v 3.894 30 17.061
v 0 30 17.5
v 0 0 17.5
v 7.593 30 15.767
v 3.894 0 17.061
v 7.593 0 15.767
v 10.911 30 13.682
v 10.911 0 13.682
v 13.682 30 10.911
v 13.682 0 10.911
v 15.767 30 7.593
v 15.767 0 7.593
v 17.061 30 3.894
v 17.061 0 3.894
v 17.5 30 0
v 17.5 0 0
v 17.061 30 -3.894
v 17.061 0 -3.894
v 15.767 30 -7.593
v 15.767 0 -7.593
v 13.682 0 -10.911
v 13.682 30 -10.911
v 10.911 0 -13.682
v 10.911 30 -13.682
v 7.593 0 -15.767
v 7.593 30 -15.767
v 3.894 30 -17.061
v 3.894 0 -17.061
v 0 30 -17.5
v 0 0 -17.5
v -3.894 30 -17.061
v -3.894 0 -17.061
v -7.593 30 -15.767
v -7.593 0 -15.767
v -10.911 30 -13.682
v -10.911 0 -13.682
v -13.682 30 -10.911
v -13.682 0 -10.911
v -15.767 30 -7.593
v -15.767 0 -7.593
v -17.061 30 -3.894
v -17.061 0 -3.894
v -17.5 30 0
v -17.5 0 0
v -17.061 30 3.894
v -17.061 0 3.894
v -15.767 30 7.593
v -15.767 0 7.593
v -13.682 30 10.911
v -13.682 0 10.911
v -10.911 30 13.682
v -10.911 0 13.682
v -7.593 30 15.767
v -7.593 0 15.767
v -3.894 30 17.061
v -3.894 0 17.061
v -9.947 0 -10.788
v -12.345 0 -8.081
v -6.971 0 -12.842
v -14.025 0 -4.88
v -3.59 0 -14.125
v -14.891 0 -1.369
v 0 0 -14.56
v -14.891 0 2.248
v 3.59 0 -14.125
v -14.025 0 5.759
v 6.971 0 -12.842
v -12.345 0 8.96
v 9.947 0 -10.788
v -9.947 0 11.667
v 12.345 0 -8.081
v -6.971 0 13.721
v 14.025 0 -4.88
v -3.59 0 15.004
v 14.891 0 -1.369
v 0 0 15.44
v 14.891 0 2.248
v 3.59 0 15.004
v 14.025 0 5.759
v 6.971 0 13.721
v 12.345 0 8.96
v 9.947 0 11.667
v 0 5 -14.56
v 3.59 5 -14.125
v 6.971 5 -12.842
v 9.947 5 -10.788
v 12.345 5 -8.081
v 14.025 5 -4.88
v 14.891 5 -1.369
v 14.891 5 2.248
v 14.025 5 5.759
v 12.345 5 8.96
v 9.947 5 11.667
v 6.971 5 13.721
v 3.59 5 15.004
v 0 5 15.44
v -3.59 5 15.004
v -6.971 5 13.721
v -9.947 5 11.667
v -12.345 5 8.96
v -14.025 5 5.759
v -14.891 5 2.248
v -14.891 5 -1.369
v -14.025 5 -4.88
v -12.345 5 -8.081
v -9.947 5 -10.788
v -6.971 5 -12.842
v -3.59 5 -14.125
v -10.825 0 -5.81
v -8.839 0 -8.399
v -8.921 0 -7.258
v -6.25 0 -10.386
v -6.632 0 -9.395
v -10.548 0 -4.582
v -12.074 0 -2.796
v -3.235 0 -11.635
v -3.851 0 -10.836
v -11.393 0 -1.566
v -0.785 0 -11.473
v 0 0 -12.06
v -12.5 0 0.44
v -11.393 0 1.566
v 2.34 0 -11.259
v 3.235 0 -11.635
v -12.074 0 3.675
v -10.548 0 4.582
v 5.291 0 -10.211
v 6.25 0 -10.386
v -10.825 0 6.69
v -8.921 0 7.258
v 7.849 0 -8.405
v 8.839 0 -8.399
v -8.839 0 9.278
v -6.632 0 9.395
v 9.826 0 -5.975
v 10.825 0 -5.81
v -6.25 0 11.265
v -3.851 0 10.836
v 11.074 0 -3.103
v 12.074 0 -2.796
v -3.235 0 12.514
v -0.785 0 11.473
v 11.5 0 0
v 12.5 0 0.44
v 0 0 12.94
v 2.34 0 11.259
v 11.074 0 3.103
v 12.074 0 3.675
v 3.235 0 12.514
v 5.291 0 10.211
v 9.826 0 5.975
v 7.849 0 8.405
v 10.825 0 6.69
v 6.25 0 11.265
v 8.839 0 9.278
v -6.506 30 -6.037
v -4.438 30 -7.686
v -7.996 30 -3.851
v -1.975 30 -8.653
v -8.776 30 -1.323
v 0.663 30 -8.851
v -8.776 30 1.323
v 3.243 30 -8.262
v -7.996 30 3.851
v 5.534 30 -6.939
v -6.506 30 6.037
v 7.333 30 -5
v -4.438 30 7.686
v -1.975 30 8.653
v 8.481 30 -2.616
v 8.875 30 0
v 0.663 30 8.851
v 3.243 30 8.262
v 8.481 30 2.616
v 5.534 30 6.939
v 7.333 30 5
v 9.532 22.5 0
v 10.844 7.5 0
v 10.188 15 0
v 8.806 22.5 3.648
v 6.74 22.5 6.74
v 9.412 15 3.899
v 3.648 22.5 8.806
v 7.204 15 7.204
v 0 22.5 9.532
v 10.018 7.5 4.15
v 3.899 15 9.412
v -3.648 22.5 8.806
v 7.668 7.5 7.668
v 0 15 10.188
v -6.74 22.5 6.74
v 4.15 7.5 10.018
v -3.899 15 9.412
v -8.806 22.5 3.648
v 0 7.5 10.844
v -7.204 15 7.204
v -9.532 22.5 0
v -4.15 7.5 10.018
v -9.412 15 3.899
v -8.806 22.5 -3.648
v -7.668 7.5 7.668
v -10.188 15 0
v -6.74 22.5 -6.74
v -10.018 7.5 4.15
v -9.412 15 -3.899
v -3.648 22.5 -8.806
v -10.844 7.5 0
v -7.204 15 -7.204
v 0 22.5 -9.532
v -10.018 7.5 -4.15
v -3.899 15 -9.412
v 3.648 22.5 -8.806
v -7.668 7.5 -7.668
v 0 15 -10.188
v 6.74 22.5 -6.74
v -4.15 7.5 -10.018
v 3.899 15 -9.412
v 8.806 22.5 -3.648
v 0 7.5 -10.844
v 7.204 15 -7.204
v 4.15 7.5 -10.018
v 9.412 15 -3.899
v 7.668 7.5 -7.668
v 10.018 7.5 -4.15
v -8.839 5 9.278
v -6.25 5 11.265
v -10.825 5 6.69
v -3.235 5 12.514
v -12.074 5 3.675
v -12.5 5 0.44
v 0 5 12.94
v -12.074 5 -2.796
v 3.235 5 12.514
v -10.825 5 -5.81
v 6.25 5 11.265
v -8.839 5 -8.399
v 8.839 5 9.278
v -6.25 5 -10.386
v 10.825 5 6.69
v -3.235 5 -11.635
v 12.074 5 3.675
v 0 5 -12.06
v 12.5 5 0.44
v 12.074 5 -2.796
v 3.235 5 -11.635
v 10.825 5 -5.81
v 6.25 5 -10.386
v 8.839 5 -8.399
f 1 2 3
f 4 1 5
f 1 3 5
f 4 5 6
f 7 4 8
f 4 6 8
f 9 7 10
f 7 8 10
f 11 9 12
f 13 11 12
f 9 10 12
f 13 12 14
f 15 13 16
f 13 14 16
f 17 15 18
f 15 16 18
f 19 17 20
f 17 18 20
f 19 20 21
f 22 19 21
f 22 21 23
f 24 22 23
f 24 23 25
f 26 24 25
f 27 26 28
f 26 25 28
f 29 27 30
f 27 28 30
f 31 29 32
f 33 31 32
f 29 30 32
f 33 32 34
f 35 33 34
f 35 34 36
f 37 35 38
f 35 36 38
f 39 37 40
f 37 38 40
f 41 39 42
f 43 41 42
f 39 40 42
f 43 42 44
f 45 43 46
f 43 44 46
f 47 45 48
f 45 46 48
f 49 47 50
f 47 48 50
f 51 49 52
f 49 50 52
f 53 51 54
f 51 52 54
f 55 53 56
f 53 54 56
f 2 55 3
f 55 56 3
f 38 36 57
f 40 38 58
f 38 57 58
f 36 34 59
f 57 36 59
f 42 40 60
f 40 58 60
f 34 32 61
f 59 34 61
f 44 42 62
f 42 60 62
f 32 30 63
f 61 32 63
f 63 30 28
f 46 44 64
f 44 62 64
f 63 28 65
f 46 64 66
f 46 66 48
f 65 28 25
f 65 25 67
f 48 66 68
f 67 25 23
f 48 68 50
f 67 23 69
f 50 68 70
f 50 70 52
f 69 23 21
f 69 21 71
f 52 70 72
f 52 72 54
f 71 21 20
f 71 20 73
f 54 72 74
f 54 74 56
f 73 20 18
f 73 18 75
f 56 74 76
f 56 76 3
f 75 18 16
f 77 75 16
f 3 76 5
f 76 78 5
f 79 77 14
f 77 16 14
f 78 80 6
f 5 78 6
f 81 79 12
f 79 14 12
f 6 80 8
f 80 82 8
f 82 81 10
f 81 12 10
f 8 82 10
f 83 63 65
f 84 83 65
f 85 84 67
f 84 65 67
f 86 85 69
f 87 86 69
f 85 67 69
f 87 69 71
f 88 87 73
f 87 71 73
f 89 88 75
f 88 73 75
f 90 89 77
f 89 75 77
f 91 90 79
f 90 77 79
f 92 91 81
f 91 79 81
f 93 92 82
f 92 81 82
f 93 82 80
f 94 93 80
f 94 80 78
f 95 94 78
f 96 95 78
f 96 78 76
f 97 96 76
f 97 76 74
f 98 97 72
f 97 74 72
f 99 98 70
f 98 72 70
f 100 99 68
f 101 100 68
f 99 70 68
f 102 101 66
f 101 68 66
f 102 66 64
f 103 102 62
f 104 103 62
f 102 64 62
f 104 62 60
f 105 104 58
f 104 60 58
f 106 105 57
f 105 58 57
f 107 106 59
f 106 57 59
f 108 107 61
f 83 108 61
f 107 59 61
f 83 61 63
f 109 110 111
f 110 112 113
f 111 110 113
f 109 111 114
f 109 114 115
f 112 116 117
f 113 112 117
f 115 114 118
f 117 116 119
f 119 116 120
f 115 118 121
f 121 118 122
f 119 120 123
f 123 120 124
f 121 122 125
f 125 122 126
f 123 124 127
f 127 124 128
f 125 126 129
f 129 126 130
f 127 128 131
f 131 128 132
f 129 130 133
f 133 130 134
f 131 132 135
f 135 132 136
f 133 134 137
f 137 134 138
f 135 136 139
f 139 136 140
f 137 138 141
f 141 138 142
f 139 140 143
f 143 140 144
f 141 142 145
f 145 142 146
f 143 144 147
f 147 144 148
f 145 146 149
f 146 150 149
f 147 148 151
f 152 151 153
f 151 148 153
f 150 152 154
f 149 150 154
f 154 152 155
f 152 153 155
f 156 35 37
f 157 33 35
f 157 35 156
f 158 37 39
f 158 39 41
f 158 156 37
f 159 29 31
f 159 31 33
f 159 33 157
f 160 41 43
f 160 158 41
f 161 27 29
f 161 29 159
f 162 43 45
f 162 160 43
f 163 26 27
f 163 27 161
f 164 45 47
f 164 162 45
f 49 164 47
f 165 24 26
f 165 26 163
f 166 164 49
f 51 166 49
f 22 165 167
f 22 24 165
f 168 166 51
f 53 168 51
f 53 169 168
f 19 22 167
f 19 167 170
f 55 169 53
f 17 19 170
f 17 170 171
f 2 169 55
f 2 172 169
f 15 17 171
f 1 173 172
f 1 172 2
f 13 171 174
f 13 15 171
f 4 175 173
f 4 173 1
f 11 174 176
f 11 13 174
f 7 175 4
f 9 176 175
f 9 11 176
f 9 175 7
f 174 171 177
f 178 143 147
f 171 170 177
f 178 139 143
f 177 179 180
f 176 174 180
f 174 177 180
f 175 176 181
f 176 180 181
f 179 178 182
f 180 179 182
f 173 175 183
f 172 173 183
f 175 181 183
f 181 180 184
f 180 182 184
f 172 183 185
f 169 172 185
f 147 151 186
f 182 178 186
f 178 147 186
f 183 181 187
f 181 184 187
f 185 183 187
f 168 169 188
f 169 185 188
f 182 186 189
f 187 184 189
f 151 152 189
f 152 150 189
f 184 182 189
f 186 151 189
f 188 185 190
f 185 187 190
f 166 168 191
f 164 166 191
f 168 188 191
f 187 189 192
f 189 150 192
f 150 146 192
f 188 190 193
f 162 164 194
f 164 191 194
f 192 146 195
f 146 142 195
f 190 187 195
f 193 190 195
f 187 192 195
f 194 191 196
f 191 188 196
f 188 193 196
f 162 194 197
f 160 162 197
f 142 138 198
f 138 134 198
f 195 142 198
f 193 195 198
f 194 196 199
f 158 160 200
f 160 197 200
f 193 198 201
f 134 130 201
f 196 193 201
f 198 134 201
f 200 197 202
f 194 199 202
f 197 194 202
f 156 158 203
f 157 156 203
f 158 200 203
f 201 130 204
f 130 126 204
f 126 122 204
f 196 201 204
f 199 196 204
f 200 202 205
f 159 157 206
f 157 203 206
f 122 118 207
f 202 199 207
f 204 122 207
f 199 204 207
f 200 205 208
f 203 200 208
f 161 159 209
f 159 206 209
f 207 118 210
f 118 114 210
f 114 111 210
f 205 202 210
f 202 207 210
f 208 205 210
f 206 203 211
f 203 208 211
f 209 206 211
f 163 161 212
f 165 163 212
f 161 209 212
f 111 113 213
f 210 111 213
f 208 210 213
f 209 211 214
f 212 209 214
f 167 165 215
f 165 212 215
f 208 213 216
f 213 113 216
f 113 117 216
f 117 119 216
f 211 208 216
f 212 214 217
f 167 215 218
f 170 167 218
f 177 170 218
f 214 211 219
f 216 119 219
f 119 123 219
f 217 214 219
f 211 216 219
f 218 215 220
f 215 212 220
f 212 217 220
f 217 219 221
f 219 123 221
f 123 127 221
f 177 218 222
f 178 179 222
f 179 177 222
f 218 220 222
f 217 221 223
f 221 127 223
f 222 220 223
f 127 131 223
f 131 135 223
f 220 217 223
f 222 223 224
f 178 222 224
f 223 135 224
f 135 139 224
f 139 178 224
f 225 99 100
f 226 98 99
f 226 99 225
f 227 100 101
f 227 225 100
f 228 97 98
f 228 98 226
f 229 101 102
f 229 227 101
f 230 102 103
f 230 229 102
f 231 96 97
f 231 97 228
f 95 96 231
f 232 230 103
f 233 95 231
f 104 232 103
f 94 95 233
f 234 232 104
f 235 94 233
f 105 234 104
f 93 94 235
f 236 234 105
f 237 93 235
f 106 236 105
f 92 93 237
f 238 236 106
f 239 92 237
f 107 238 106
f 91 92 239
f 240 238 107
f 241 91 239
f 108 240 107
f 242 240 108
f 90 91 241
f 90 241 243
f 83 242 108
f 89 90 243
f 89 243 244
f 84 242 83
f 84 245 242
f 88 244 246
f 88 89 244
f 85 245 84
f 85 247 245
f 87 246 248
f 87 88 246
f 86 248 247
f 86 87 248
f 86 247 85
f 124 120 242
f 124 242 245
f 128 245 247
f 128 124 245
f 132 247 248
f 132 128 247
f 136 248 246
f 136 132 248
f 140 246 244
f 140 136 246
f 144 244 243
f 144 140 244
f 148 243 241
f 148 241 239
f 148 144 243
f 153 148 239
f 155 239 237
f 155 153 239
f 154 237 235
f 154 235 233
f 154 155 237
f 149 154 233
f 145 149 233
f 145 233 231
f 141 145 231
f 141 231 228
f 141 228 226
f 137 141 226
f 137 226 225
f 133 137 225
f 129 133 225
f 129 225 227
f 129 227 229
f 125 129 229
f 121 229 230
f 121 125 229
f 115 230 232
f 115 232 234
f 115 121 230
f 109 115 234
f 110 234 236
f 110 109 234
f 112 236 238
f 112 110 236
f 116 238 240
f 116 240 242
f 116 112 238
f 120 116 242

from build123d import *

# Parameters (mm, degrees)
SKETCH2_R           = 17.5
BOSS_EXTRUDE2_DEPTH = 30
SKETCH3_R           = 11.5
CUT_EXTRUDE1_DEPTH  = 30
CUT_EXTRUDE1_DRAFT  = -5
SKETCH4_R           = 15
SKETCH4_R_2         = 12.5
CUT_EXTRUDE2_DEPTH  = 5


with BuildPart() as part:
    # Sketch2 → Boss-Extrude2 (new body)
    with BuildSketch(Plane(origin=(0, 0, 0), x_dir=(1, 0, 0), z_dir=(0, 1, 0))):
        with Locations(Location((0, 0, 0), (0, 0, 270))):
            Circle(SKETCH2_R)
    extrude(amount=BOSS_EXTRUDE2_DEPTH)


with BuildPart() as cut_extrude1_tool:
    # Sketch3 → Cut-Extrude1 (with draft: the straight prism first)
    with BuildSketch(Plane.XZ):
        Circle(SKETCH3_R)
    extrude(amount=-CUT_EXTRUDE1_DEPTH)
    # Cut-Extrude1: the draft: its side faces are tilted about the plane it starts from
    cut_extrude1_sides = [cut_extrude1_tool.faces().sort_by_distance(p)[0] for p in [
        (-11.5, 15, 0),
    ]]
    draft(cut_extrude1_sides, Plane.XZ, CUT_EXTRUDE1_DRAFT)


with BuildPart() as part_1:
    add(part.part)

    # Cut-Extrude1: cut by cut_extrude1_tool
    add(cut_extrude1_tool.part, mode=Mode.SUBTRACT)

    # Sketch4 → Cut-Extrude2 (cut)
    with BuildSketch(Plane.XZ):
        with Locations(Location((0, 0.439504446, 0), (0, 0, 270))):
            Circle(SKETCH4_R)
        with Locations(Location((0, 0.439504446, 0), (0, 0, 270))):
            Circle(SKETCH4_R_2, mode=Mode.SUBTRACT)
    extrude(amount=-CUT_EXTRUDE2_DEPTH, mode=Mode.SUBTRACT)


solid = part_1.part
